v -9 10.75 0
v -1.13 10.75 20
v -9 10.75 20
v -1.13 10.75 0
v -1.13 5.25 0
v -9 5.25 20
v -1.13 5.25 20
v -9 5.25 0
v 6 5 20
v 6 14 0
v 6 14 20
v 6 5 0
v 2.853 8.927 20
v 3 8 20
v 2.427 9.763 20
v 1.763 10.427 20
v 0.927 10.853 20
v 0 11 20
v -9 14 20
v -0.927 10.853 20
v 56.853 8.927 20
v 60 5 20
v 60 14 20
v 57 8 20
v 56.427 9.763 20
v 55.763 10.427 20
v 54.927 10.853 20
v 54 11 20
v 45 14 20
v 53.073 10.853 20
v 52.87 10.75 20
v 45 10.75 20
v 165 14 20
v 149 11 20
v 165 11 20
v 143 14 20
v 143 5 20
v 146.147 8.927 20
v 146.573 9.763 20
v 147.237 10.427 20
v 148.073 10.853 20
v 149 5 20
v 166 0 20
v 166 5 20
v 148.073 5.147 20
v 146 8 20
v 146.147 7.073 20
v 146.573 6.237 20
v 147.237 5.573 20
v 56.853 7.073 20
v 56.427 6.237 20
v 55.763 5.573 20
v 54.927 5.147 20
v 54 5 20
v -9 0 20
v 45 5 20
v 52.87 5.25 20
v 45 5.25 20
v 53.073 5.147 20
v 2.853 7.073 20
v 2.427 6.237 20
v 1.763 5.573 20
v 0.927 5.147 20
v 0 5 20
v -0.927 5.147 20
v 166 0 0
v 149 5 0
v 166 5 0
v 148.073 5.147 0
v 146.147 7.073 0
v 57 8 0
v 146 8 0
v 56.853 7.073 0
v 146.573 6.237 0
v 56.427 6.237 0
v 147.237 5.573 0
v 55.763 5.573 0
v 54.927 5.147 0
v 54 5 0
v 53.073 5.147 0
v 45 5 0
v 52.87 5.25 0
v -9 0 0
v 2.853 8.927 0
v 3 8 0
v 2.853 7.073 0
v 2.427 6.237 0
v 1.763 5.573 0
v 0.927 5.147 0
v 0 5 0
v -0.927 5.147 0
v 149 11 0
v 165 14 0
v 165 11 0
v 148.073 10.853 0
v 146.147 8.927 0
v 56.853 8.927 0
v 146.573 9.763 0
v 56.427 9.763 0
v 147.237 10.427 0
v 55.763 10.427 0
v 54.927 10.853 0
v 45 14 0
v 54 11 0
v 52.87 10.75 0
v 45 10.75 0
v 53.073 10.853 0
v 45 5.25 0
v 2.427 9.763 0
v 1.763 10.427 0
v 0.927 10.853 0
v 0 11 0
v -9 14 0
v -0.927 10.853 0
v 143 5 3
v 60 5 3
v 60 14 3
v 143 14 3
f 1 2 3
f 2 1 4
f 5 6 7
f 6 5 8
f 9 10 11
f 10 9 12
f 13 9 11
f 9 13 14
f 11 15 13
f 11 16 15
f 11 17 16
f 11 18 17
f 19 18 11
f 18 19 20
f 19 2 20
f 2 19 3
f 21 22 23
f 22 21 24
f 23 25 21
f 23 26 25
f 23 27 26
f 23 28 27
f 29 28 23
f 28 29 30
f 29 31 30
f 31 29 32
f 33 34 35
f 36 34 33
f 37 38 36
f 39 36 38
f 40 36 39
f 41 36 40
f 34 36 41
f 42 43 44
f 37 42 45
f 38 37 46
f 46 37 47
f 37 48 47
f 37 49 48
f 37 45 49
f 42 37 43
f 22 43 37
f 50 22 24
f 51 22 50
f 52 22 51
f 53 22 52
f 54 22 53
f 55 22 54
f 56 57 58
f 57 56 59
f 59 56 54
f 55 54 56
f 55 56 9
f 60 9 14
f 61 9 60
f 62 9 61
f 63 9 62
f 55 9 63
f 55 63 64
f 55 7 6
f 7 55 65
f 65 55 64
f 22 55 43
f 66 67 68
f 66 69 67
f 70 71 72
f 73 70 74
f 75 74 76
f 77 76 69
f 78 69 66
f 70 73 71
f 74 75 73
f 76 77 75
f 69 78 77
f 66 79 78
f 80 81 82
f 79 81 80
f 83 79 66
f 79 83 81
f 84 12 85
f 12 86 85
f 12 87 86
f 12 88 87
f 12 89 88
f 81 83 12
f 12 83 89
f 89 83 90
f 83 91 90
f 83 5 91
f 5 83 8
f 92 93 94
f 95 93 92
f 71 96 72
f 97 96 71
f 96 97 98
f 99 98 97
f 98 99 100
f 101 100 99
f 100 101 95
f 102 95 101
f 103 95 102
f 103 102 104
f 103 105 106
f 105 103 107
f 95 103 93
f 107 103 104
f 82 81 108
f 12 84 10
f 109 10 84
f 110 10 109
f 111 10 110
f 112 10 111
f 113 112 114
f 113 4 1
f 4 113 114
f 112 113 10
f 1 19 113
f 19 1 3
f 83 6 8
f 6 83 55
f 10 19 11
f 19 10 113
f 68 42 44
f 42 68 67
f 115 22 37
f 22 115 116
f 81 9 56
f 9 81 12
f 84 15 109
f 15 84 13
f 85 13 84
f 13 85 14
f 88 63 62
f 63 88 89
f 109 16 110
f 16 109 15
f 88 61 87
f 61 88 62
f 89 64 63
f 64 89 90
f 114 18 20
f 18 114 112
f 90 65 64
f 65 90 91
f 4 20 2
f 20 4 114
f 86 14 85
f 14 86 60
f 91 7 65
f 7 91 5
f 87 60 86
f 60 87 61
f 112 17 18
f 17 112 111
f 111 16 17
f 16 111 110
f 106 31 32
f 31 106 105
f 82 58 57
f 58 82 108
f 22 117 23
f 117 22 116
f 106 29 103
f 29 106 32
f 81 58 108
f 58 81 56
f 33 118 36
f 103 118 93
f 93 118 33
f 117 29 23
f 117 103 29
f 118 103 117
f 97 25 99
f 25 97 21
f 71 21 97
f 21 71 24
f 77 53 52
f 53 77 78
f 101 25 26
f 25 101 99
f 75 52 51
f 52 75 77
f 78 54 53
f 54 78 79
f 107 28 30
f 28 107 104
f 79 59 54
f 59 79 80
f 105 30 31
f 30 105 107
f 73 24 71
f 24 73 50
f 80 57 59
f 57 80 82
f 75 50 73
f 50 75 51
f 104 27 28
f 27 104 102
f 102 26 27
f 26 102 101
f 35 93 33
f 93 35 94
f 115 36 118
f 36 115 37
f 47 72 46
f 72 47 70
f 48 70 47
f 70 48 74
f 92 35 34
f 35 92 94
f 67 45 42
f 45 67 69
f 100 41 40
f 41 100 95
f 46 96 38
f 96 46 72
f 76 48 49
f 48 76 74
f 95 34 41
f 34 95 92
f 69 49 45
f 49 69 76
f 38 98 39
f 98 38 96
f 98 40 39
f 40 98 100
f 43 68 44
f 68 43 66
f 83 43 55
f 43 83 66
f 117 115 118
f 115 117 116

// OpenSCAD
// Use partname to control which object is being rendered:
//
// _partname_values connector_rack
partname = "display";

// $fa is the minimum angle for a fragment. Minimum value is 0.01.
$fa = 12;
// $fs is the minimum size of a fragment. If high, causes
// fewer-than-$fa-would-indicate surfaces. Minimum is 0.01.
$fs = 2;

inter_rack_h_range = [95,105];
lower_rack_h = 54;
metal_piece_r = 2.5;

wall_w = 3;
piece_wd = [20,5];

module clasp ()
{
  translate([-3*wall_w,piece_wd[1],0])
  {
    difference()
    {
      cube([5*wall_w,3*wall_w,piece_wd[0]]);

      translate([3*wall_w,wall_w,-0.01])
        cylinder(r=1.2*metal_piece_r,h=piece_wd[0]+0.02,$fn=20);
      for(off = [0,3*wall_w])
      {
        hull()
        {
          for(off = [0,3*wall_w])
            translate([off,wall_w,-0.01])
              cylinder(r=1.1*metal_piece_r,h=piece_wd[0]+0.02,$fn=20);
        }
      }
    }
  }
}

module holder ()
{
  translate([-wall_w-1.2*metal_piece_r,piece_wd[1],0])
  {
    difference()
    {
      cube([
        max(inter_rack_h_range)-min(inter_rack_h_range)+3*wall_w + 1.2*metal_piece_r,
        3*wall_w,
        piece_wd[0]]);

      hull()
      {
        for(off = [wall_w+1.2*metal_piece_r,max(inter_rack_h_range)])
          translate([off,wall_w,-0.01])
            cylinder(r=1.2*metal_piece_r,h=piece_wd[0]+0.02,$fn=20);
      }
    }
  }
}


module connector_rack ()
{

  translate([-3*wall_w,0,0])
    cube([
      max(inter_rack_h_range)+54+2*wall_w+(max(inter_rack_h_range)-min(inter_rack_h_range)),
      piece_wd[1],
      piece_wd[0]
    ]);
  for (off = [0,54])
    translate([off,0,0])
     clasp();

  translate([54+wall_w+1.2*metal_piece_r,piece_wd[1],0])
    cube([min(inter_rack_h_range)-2*(wall_w+1.2*metal_piece_r),3*wall_w,wall_w]);

  translate([54+min(inter_rack_h_range),0,0])
    holder();
}





// Conventions:
// * When an object is rendered using partname, position/rotate it according to
//   printing suggestion, here. (The module itself will be positioned/rotated
//   like it will be, in the put-together "display" situation.)
// * The special value "display" for partname is the product picture for all
//   parts put together.
if ("display" == partname)
{
  connector_rack();
} else if ("connector_rack" == partname)
{
  rotate([0,0,0])
  {
    connector_rack();
  }
}
